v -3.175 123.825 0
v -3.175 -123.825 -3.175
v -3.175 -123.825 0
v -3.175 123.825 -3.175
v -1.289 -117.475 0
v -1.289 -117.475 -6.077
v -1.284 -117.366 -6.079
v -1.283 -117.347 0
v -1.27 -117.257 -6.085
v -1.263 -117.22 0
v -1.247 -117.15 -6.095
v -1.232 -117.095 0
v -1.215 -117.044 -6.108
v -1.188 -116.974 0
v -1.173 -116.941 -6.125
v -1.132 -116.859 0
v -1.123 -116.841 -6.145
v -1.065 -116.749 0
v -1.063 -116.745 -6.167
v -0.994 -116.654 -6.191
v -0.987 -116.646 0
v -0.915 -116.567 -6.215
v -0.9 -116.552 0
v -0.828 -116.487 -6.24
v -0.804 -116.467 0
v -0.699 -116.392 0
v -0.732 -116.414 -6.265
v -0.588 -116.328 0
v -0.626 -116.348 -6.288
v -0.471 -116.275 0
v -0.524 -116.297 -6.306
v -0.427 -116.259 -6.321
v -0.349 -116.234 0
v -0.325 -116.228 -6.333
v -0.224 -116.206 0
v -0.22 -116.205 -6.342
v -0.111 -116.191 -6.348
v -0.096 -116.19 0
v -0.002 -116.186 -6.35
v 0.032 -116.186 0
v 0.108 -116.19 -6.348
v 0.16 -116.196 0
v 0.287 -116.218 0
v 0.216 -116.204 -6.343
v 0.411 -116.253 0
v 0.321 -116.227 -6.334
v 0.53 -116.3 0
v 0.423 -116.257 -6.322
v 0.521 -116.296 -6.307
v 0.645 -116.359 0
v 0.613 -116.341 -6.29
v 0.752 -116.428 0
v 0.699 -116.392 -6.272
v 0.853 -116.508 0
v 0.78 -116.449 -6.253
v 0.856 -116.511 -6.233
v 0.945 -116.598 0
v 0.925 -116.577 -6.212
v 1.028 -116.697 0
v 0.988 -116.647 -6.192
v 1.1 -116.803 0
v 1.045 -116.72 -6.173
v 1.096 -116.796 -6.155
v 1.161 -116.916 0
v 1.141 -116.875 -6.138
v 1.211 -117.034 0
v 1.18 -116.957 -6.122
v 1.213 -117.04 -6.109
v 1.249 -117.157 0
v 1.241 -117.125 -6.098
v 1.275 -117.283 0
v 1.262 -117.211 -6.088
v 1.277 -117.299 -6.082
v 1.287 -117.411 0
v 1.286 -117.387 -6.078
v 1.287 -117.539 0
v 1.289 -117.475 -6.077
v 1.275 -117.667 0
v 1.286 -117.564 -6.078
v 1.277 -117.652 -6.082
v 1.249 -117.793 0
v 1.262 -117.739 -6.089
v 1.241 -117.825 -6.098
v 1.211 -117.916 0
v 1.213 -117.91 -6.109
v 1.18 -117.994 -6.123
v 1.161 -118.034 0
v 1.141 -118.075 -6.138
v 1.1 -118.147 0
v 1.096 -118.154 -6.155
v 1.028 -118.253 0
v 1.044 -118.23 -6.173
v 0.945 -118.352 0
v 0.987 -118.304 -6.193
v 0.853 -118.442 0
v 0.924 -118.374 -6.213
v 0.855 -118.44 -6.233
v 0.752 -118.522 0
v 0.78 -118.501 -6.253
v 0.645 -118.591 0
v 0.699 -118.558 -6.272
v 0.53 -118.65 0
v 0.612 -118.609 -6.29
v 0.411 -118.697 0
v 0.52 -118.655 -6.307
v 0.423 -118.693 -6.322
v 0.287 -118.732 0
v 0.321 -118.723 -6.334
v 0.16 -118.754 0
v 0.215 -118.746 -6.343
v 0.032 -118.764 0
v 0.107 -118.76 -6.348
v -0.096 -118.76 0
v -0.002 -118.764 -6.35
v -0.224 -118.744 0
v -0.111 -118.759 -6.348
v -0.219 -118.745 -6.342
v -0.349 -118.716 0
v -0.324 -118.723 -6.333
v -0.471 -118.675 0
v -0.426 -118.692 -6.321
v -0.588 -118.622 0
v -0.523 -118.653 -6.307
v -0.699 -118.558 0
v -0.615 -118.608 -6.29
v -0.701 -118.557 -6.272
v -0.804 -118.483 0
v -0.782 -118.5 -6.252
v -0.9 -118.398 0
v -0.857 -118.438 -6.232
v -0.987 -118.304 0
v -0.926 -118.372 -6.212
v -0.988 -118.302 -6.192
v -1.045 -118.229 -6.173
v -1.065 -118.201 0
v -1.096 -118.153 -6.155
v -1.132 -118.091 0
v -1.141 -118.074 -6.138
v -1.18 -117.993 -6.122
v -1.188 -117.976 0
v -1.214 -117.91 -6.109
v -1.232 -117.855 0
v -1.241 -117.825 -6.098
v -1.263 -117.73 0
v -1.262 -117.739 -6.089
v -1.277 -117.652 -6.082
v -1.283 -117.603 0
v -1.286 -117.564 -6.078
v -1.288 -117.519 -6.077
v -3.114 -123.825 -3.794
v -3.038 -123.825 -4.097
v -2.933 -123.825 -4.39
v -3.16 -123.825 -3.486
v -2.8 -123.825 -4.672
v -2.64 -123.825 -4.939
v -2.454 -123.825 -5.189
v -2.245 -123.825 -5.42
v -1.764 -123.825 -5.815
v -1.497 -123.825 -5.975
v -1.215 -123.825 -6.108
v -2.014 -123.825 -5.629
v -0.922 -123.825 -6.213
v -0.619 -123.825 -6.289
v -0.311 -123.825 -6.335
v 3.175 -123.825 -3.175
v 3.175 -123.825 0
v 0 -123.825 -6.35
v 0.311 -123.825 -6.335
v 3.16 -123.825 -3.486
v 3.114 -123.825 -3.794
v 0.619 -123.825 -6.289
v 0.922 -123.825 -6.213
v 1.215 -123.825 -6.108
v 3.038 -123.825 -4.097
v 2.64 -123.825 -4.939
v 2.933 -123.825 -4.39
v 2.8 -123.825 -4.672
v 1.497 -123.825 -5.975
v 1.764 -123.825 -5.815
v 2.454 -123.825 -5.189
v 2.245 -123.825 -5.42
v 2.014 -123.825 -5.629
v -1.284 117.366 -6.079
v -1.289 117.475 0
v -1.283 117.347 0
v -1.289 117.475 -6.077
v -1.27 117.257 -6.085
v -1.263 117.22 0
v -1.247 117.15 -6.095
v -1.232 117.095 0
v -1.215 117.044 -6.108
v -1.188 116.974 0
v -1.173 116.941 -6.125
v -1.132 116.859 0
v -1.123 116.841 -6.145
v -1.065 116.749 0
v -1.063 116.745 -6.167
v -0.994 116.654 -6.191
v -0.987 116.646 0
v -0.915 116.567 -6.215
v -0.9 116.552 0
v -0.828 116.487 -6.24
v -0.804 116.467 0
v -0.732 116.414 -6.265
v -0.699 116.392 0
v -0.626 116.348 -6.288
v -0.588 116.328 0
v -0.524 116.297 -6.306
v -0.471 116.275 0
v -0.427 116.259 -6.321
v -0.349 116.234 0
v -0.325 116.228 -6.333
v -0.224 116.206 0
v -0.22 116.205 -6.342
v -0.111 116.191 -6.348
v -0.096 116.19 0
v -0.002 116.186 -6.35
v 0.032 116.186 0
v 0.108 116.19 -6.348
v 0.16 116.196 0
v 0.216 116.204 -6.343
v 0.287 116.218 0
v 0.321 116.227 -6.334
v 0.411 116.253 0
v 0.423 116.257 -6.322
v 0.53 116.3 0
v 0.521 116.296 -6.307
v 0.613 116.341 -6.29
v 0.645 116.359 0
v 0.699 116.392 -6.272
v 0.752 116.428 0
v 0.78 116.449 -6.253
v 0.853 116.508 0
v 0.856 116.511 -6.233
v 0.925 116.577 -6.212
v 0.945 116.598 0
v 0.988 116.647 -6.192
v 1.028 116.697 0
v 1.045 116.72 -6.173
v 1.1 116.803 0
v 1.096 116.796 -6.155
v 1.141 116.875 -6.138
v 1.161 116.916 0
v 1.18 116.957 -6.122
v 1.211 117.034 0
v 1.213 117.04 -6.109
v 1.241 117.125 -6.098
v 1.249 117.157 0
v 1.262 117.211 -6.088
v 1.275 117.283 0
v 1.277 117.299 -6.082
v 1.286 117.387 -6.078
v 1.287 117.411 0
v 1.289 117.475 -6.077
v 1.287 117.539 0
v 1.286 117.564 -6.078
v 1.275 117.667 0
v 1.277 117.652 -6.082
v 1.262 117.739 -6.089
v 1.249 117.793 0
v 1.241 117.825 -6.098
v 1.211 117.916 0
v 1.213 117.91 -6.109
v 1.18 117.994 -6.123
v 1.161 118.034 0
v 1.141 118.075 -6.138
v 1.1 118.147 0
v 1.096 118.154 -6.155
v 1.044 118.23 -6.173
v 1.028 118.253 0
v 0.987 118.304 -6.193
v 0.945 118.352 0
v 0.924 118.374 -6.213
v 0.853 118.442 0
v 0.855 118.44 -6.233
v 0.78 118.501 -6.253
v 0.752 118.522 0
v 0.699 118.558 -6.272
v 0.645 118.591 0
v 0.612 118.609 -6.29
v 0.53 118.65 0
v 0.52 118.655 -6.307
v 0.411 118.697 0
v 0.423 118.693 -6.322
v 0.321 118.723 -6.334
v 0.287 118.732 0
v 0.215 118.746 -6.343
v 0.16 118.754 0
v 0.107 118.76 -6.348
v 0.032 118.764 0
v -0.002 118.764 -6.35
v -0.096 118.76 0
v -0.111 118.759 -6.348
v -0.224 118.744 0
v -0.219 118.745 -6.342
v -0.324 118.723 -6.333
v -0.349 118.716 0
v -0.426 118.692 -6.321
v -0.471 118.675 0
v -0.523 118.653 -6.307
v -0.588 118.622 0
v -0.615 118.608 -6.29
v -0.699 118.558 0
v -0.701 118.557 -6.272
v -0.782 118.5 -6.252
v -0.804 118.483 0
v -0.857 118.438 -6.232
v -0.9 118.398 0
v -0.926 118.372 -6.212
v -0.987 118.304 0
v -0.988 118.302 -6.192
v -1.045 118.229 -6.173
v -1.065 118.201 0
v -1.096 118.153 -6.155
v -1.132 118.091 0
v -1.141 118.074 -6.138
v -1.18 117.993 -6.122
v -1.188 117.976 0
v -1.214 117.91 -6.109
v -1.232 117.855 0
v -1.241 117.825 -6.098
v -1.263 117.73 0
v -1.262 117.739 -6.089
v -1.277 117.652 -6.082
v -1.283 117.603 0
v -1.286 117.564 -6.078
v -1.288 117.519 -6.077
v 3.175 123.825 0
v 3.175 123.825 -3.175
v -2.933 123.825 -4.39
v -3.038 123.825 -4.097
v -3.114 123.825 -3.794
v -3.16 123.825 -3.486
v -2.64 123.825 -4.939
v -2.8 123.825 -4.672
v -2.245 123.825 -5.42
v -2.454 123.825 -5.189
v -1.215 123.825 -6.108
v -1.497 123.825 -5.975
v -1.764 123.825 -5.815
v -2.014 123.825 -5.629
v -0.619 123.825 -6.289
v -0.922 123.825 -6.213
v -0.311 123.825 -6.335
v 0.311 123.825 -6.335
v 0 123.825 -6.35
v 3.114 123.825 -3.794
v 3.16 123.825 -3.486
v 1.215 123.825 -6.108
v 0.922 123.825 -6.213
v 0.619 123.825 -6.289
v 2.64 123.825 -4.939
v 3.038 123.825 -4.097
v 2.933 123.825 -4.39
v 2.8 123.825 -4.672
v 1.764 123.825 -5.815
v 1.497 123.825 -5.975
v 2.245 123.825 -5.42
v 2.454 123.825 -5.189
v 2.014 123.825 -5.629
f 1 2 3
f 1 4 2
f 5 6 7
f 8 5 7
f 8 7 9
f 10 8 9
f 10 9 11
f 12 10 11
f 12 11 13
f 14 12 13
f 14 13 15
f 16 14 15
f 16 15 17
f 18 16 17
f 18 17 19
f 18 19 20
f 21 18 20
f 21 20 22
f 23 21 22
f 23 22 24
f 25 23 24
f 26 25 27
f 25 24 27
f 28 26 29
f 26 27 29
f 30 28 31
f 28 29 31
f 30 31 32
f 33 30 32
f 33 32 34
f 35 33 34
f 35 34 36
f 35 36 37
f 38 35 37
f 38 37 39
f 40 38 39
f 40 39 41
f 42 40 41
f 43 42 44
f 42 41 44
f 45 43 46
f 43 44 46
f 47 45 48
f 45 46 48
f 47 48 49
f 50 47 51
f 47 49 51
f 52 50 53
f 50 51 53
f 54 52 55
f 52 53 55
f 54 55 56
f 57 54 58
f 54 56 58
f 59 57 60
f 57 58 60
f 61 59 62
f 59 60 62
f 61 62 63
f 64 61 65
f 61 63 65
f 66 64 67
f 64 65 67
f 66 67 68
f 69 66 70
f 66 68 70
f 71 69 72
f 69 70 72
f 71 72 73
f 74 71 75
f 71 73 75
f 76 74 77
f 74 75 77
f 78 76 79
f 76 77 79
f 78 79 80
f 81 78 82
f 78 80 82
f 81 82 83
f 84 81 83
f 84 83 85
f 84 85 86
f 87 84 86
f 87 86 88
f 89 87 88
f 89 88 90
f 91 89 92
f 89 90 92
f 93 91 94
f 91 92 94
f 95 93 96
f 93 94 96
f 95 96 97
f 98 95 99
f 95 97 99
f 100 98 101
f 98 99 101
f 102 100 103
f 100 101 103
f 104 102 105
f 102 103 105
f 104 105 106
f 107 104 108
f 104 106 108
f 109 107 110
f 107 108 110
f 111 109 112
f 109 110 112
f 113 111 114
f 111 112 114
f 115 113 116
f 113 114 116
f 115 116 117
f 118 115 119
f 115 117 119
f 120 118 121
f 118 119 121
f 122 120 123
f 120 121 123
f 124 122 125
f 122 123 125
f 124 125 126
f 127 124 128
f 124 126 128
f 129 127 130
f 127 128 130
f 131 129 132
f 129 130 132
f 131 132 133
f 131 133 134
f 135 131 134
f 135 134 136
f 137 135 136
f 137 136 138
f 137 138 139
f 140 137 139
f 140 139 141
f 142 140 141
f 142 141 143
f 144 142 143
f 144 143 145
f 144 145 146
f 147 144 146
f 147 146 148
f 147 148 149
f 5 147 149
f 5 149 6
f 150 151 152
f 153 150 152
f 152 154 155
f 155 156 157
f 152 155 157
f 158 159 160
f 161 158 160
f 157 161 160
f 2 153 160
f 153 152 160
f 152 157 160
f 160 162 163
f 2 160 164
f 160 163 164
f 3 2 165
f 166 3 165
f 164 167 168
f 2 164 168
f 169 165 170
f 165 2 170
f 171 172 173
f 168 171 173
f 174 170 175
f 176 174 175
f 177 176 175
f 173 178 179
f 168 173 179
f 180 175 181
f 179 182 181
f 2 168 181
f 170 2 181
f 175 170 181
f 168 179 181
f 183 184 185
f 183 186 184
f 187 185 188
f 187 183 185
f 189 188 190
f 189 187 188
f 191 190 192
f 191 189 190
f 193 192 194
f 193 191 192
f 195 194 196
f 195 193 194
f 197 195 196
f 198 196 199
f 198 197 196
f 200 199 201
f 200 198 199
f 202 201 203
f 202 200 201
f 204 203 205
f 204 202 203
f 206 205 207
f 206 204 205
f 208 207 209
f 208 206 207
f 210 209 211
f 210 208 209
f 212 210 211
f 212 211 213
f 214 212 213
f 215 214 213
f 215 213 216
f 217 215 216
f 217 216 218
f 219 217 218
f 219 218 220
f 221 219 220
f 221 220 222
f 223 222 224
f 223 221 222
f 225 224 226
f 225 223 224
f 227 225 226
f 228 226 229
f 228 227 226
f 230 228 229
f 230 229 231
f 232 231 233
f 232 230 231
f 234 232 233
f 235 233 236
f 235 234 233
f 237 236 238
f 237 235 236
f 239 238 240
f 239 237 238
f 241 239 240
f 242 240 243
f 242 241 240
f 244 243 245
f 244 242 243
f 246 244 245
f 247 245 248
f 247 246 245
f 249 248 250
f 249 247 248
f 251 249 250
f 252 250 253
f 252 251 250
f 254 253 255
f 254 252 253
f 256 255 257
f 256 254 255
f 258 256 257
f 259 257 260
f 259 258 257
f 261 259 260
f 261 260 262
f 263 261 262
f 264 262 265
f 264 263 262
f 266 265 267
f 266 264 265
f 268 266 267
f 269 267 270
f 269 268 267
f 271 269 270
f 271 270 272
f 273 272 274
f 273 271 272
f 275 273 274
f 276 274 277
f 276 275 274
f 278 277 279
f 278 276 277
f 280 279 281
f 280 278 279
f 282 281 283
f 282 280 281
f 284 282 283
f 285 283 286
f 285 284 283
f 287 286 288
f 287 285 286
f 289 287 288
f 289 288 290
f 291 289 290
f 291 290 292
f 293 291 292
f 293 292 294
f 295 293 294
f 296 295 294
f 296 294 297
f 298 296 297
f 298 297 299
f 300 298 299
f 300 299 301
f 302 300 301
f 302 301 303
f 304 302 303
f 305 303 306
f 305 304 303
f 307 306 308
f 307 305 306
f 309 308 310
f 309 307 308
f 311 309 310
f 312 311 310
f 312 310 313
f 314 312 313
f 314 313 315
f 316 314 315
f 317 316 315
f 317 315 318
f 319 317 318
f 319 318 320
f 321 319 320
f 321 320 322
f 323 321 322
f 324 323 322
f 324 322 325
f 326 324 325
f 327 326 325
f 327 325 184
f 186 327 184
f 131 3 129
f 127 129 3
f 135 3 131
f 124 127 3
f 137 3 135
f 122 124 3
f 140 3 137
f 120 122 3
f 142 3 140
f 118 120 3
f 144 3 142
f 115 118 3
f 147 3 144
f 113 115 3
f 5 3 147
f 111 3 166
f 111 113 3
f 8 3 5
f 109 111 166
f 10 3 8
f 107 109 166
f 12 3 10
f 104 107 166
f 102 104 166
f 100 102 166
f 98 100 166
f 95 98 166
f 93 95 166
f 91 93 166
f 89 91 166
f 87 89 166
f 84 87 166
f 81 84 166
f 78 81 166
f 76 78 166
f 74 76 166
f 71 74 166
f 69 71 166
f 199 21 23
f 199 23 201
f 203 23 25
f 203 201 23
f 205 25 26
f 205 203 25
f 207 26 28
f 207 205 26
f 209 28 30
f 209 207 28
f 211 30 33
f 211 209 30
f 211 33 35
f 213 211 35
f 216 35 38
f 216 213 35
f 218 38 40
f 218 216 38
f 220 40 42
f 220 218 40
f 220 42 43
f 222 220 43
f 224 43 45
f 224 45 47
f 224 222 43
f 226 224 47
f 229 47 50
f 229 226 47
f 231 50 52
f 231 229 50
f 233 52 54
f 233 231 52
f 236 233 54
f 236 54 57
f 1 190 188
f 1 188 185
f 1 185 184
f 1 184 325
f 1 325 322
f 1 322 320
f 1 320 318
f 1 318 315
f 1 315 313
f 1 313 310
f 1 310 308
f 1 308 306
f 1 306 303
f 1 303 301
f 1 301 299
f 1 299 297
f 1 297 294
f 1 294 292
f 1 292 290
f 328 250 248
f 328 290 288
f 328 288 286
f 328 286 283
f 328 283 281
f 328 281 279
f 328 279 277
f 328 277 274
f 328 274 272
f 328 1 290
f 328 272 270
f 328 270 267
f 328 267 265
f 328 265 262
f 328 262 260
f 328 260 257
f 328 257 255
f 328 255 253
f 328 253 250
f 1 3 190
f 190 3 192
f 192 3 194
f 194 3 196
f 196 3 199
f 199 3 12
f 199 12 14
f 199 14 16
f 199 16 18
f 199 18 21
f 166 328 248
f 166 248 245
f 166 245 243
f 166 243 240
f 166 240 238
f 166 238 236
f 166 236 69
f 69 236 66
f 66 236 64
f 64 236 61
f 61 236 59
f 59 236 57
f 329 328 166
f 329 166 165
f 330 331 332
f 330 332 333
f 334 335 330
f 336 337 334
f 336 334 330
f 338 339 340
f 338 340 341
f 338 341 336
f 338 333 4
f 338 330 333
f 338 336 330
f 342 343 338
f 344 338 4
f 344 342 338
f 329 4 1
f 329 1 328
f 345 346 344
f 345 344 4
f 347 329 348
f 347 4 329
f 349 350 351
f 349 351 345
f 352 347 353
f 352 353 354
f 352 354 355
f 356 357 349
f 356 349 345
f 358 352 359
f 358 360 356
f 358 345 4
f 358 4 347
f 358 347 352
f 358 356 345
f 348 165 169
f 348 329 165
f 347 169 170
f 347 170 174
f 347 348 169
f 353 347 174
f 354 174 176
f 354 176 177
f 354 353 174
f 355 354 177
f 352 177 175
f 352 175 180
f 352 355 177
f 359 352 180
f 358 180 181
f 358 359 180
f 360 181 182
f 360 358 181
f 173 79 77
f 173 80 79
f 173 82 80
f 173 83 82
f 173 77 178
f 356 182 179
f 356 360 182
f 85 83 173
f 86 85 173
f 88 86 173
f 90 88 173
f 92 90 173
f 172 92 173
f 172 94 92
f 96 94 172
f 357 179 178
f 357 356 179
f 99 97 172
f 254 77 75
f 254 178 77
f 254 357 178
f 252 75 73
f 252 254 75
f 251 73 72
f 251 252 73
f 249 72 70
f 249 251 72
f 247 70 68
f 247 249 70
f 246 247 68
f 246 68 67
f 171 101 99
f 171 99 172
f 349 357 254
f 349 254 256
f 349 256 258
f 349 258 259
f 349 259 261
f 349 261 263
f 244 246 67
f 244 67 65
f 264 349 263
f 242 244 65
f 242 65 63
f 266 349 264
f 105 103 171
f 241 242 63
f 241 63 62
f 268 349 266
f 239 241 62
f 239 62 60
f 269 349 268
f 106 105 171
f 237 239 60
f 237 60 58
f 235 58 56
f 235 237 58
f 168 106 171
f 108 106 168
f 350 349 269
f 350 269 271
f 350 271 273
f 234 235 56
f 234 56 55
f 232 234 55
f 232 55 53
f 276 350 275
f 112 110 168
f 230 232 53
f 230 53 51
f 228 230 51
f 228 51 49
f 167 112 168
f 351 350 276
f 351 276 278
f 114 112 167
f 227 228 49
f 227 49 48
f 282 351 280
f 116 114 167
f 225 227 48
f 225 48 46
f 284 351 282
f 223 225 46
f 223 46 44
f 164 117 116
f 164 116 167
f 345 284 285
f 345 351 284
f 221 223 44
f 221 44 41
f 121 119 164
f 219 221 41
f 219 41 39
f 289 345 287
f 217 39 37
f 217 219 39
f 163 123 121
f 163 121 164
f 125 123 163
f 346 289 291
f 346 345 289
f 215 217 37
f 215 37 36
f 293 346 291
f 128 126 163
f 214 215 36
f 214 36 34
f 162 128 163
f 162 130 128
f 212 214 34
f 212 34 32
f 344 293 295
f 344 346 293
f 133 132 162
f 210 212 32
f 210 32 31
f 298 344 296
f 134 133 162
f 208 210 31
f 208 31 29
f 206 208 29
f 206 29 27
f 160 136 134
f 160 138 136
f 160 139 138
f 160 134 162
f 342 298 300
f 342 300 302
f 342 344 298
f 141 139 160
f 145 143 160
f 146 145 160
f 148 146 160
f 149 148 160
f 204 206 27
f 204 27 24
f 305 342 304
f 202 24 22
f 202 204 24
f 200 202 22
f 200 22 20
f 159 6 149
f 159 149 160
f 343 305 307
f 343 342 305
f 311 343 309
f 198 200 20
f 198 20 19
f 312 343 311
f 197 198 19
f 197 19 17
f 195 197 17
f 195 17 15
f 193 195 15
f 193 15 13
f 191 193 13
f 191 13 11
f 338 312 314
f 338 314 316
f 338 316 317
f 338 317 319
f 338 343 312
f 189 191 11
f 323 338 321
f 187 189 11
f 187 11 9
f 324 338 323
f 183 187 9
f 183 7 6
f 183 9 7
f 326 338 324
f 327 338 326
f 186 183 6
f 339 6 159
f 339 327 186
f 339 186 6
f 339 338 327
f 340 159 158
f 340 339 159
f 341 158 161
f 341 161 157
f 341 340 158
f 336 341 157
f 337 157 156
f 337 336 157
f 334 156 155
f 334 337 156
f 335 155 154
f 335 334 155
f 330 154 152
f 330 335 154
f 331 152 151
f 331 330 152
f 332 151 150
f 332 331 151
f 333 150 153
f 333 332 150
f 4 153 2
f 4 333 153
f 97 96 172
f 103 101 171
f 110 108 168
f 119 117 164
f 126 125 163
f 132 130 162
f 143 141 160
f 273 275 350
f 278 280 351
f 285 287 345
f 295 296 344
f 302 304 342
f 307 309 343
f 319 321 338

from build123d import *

# Parameters (mm, degrees)
BOSS_EXTRUDE1_DEPTH   = 123.825
F_5_40_TAPPED_HOLE1_D = 2.5781


with BuildPart() as part:
    # Sketch1 → Boss-Extrude1 (new, symmetric)
    with BuildSketch(Plane(origin=(0, 0, 0), x_dir=(1, 0, 0), z_dir=(0, 1, 0))):
        with BuildLine():
            Line((-3.175, 3.175), (-3.175, 0))
            Line((-3.175, 0), (3.175, 0))
            Line((3.175, 0), (3.175, 3.175))
            ThreePointArc((3.175, 3.175), (0, 6.35), (-3.175, 3.175))
        make_face()
    extrude(amount=BOSS_EXTRUDE1_DEPTH, both=True)

    # #5-40 Tapped Hole1 (through all)
    with Locations(Plane.XY):
        with Locations((0, -117.475)):
            f_5_40_tapped_hole1 = Hole(F_5_40_TAPPED_HOLE1_D / 2)

    # Mirror1: #5-40 Tapped Hole1 across plane
    add(f_5_40_tapped_hole1.mirror(Plane.ZX), mode=Mode.SUBTRACT)


solid = part.part
